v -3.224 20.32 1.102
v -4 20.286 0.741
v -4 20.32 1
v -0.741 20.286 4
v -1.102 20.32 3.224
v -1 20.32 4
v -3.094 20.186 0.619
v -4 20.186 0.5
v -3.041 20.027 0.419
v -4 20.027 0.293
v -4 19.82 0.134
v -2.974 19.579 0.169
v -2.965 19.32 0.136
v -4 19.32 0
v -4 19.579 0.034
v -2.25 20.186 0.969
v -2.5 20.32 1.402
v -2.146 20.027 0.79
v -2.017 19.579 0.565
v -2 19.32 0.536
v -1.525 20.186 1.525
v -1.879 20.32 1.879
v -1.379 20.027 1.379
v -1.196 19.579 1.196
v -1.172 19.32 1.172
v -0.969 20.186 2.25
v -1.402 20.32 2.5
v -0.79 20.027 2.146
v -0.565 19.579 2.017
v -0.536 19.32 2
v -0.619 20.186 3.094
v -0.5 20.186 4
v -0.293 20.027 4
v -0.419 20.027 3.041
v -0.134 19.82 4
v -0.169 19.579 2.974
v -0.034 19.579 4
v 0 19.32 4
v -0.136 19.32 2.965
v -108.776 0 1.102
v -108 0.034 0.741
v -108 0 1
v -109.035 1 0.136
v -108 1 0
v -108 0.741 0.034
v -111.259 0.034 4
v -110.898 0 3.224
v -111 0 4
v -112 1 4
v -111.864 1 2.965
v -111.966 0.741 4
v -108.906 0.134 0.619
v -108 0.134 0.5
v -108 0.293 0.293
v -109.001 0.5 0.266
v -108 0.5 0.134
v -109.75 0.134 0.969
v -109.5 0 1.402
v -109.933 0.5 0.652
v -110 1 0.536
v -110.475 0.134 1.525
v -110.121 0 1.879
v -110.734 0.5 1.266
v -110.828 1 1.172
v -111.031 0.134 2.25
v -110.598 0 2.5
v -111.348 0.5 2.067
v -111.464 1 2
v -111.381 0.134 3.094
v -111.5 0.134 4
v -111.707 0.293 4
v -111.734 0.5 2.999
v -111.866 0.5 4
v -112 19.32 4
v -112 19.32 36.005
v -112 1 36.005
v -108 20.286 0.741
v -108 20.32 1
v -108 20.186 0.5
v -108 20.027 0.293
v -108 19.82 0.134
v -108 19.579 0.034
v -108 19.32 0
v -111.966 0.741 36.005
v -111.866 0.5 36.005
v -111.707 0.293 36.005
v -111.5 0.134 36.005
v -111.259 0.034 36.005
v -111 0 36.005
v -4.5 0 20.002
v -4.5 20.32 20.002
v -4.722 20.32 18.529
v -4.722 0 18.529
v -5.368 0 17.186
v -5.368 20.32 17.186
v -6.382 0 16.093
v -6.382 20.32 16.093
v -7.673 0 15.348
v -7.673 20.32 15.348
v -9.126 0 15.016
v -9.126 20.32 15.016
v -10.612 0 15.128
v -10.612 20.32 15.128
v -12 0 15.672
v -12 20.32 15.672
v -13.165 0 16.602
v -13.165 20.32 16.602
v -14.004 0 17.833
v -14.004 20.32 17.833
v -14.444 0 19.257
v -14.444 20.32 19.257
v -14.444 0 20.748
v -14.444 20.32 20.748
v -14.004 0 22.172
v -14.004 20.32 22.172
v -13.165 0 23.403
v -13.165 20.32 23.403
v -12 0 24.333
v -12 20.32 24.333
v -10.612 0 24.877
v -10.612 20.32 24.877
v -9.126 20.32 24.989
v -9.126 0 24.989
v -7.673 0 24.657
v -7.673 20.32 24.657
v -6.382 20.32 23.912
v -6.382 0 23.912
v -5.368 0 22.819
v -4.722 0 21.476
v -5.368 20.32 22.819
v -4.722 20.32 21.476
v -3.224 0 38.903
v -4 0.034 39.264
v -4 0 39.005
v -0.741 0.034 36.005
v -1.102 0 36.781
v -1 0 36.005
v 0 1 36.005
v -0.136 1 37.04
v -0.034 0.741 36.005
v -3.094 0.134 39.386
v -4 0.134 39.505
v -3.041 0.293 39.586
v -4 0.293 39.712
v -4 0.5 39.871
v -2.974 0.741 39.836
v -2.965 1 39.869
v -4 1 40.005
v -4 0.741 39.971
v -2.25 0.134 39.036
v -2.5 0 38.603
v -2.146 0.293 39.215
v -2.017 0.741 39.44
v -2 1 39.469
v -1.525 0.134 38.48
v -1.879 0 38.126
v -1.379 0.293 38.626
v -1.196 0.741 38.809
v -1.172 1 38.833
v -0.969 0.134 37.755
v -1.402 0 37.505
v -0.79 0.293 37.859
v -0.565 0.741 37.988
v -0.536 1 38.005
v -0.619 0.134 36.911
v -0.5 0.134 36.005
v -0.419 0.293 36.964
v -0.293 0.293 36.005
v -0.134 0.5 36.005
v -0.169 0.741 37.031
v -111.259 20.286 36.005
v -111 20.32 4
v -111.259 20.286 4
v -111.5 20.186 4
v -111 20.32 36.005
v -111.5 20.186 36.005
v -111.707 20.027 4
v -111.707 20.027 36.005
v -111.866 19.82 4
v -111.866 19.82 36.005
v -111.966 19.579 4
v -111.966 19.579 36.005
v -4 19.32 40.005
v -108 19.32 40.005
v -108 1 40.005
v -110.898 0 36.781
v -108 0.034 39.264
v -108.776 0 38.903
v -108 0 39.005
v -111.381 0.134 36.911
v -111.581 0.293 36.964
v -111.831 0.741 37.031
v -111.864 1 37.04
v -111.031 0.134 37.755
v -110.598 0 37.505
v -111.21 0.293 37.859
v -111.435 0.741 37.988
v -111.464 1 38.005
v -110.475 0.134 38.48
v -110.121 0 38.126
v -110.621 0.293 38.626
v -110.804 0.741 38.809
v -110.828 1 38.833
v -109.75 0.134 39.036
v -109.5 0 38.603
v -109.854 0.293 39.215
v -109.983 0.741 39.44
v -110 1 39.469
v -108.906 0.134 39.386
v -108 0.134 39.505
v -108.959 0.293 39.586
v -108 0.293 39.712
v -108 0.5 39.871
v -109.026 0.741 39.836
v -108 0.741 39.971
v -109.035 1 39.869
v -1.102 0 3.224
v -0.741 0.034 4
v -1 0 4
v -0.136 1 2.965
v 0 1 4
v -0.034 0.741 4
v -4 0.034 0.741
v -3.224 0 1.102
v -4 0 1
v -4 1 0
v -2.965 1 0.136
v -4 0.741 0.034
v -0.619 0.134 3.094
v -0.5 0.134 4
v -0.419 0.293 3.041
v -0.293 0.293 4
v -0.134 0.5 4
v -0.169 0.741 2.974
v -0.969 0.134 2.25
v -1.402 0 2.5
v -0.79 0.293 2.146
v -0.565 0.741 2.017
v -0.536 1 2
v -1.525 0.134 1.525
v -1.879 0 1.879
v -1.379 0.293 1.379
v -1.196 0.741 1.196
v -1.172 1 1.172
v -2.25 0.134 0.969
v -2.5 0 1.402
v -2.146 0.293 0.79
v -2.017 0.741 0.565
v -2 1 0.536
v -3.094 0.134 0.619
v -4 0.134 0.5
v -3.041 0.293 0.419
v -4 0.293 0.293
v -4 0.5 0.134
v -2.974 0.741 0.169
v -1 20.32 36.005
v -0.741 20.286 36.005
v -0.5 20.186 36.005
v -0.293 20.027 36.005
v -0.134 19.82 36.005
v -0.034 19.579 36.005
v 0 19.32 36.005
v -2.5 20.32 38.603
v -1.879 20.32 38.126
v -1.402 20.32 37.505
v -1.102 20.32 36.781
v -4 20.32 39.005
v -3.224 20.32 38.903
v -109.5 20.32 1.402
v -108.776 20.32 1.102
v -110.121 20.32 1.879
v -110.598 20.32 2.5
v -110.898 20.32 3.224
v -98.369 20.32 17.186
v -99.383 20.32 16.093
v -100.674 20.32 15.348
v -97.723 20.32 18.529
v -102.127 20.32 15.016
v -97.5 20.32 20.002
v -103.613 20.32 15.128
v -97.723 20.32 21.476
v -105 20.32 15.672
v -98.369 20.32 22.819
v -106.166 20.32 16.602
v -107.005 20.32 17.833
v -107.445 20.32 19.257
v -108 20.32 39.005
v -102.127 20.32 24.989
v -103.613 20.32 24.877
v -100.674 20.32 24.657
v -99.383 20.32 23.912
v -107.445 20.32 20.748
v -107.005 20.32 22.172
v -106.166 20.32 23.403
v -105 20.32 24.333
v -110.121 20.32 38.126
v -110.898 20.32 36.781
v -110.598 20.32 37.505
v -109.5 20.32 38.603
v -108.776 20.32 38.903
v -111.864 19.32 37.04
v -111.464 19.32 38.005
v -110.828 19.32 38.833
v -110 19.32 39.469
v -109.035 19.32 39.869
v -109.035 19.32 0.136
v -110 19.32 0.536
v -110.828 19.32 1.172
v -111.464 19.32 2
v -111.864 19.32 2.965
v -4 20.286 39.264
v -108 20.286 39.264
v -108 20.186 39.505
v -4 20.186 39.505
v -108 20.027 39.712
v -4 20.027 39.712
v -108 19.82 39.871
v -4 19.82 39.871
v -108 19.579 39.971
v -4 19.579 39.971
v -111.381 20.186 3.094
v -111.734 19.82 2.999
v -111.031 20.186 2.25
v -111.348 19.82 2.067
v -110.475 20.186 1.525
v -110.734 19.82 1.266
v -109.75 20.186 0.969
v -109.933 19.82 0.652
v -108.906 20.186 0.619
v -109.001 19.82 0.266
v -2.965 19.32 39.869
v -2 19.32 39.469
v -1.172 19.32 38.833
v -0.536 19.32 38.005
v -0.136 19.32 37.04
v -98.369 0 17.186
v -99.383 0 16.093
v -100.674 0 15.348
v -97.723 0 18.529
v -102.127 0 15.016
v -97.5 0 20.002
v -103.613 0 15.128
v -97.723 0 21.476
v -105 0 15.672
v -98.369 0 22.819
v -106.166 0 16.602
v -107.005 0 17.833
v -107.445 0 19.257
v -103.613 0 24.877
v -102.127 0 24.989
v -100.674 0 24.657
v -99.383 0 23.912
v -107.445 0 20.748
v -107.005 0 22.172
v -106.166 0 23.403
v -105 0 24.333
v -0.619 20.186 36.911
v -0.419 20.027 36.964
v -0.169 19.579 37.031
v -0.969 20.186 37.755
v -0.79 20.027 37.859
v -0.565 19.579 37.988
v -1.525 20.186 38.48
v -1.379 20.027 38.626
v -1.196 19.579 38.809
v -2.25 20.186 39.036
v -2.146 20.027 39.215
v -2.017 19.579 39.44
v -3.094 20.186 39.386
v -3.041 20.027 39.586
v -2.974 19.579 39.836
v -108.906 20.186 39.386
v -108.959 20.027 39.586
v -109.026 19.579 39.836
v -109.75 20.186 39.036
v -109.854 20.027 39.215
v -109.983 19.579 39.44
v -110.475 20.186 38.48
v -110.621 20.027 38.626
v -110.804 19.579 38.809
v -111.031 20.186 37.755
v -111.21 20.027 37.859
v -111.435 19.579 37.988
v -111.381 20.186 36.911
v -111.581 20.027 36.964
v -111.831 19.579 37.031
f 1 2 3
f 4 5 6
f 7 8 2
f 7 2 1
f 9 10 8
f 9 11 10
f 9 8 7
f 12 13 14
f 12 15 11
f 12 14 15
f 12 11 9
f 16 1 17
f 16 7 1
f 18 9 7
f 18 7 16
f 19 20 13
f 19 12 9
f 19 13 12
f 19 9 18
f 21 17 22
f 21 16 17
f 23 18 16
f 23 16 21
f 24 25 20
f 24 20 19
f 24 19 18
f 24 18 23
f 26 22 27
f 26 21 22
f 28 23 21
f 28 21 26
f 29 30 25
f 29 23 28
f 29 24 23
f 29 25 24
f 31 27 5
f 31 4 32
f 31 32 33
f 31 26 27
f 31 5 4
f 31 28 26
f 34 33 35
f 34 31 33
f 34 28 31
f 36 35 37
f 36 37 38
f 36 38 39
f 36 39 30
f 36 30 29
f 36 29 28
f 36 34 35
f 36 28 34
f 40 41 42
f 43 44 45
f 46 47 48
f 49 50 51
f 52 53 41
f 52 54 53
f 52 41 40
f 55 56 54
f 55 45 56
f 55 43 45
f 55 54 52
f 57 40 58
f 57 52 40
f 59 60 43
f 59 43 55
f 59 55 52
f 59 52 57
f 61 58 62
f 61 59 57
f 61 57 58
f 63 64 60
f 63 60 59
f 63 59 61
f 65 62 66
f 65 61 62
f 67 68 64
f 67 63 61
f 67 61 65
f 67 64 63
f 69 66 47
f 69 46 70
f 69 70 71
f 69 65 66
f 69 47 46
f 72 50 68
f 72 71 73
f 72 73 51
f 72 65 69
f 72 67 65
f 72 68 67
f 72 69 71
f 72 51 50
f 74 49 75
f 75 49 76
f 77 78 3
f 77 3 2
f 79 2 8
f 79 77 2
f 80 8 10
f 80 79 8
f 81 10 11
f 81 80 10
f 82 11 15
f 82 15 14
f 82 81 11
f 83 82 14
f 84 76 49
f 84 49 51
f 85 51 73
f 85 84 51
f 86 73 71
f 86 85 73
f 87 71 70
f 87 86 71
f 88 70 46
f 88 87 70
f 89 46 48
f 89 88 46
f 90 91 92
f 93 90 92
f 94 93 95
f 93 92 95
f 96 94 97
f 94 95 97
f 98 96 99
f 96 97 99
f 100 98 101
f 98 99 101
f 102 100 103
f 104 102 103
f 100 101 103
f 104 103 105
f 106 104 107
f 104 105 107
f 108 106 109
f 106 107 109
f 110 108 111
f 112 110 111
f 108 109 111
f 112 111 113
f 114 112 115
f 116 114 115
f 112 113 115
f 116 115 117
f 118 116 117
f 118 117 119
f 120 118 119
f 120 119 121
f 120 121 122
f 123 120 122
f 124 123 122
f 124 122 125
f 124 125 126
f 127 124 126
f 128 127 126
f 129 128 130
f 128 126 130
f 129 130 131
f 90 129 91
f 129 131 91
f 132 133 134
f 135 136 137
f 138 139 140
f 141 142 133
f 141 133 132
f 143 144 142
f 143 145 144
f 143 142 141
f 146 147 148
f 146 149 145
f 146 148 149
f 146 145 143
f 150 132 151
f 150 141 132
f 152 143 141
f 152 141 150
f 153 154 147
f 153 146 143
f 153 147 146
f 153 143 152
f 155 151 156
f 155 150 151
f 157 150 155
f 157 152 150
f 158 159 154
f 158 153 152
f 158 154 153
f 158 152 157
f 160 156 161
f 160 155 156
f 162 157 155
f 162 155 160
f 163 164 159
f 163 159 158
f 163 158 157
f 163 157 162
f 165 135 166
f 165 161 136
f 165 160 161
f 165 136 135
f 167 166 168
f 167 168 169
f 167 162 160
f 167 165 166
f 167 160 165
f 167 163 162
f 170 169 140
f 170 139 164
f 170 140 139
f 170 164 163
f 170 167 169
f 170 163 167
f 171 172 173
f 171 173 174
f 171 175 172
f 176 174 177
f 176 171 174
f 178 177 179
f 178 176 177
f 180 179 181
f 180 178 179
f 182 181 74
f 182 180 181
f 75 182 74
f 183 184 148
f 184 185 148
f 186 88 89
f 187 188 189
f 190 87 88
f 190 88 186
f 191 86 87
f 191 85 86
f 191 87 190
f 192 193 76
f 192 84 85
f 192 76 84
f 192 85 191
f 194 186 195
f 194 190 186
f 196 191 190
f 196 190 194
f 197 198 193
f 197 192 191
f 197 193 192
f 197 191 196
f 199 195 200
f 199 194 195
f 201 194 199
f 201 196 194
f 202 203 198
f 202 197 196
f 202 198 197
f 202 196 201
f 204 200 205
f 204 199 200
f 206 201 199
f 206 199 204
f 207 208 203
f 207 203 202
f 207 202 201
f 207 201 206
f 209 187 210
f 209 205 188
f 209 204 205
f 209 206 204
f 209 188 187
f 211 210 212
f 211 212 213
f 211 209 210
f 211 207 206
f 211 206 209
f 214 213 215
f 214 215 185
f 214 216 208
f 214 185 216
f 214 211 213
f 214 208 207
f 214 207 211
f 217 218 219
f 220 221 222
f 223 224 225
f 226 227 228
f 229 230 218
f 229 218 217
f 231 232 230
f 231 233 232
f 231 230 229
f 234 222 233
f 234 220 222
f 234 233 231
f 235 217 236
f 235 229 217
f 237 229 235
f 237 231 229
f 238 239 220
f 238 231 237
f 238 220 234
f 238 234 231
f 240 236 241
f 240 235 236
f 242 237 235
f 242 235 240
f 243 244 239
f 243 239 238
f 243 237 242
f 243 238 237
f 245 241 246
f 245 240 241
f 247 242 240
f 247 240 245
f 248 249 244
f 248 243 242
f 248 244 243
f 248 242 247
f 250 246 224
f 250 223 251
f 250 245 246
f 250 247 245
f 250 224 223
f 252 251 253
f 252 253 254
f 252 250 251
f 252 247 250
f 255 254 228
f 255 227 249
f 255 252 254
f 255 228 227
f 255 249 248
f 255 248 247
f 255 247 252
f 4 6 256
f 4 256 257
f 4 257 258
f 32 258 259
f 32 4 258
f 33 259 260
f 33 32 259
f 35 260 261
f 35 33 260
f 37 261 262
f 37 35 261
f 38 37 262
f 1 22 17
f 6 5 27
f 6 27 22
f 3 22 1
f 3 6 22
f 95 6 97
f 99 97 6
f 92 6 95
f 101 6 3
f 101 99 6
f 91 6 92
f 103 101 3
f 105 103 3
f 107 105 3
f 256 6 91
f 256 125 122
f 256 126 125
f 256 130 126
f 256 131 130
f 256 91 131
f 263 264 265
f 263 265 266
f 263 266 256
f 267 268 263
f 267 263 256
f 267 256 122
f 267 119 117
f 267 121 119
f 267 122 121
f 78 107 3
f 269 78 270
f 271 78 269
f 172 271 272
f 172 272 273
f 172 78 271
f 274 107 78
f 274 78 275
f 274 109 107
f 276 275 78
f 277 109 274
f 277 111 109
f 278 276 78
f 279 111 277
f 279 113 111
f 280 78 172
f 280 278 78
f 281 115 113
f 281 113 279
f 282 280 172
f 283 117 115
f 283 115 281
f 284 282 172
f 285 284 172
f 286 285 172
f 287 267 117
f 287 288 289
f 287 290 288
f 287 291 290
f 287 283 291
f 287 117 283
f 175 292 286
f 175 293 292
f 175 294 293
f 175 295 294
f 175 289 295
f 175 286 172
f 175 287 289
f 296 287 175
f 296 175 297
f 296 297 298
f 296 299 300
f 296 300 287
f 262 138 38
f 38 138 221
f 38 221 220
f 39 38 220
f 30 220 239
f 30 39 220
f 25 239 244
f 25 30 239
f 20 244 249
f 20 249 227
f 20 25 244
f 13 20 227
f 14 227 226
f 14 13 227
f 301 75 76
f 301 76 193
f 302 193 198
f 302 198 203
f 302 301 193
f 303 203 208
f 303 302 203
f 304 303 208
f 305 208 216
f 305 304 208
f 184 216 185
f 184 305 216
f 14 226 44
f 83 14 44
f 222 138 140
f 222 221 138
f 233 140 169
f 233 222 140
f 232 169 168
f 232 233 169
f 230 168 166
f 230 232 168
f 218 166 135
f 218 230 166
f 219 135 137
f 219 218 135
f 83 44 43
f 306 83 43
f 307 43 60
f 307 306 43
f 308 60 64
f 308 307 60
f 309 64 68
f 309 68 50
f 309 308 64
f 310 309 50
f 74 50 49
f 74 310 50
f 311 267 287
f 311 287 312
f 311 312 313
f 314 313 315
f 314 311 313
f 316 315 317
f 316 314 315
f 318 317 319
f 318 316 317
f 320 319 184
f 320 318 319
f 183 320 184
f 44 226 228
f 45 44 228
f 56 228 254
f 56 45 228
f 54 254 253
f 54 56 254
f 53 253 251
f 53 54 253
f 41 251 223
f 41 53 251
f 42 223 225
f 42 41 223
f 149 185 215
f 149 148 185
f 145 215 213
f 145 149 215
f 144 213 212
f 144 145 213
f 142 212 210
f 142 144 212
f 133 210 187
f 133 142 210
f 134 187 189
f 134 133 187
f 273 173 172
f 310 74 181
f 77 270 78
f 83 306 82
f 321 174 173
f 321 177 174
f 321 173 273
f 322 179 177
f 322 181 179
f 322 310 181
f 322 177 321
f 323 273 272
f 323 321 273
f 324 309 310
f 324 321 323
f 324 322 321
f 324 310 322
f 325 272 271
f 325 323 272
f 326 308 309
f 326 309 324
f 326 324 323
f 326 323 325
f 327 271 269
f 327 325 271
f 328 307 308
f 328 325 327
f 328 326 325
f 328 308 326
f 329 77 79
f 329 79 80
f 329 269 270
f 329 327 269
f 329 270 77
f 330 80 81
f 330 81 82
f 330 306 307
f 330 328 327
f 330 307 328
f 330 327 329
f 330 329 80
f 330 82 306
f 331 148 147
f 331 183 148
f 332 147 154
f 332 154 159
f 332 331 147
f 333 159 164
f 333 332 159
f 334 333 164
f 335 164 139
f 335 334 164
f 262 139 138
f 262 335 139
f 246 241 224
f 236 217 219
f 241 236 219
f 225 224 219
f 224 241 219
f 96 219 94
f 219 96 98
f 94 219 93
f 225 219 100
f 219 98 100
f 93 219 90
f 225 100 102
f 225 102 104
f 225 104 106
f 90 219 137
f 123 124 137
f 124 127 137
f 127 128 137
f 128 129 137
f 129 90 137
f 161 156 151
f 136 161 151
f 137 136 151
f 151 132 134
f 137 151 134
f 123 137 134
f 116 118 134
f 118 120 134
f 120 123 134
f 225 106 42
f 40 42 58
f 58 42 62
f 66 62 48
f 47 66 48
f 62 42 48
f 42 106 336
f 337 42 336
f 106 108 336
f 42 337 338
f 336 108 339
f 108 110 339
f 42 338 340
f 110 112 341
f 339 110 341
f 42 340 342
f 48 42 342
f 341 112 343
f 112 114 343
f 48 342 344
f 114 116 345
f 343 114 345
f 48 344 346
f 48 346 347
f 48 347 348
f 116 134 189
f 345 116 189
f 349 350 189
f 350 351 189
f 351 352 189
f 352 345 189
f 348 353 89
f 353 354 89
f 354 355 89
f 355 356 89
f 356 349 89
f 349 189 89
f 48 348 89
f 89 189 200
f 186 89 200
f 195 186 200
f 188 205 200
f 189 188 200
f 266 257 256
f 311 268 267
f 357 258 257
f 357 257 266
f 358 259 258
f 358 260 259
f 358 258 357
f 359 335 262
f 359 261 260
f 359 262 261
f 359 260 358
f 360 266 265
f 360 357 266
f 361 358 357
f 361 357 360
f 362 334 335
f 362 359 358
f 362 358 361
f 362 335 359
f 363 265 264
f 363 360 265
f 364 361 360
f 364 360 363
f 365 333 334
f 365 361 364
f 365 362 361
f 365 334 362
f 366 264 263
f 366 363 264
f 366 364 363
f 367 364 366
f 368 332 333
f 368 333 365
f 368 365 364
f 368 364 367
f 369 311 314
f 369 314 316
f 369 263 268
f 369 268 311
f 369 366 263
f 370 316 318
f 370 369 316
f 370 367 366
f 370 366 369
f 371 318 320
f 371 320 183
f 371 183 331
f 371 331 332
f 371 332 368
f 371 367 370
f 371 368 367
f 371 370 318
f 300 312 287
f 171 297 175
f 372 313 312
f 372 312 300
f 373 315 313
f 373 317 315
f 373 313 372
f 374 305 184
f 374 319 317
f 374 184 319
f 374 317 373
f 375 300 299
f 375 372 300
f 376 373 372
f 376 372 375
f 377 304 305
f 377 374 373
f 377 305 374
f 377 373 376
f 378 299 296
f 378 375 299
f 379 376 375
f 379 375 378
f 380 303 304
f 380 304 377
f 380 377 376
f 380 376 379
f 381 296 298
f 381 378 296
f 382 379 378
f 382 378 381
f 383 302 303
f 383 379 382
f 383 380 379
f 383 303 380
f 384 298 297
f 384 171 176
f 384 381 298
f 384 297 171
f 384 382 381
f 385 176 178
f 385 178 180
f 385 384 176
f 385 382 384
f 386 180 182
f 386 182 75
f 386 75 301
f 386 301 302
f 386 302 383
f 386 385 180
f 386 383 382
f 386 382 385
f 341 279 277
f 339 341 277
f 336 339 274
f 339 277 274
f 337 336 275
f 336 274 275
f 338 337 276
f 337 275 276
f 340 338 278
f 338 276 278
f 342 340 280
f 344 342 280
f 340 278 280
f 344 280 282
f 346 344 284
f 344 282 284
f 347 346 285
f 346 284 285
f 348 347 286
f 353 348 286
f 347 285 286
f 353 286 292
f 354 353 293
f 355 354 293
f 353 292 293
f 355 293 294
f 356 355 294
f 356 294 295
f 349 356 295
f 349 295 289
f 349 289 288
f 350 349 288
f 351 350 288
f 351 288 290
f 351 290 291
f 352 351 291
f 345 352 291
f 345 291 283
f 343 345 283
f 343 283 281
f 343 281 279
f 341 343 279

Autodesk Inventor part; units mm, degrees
ref_plane "YZ Plane" through (0, 0, 0) normal (1, 0, 0) x (0, 1, 0)
ref_plane "XZ Plane" through (0, 0, 0) normal (0, 1, 0) x (-1, 0, 0)
ref_plane "XY Plane" through (0, 0, 0) normal (0, 0, 1) x (1, 0, 0)
sketch "Sketch1" plane through (0, 0, 0) normal (0, 1, 0) x (-1, 0, 0)
  line L0 (0, 0) -> (112, 0)
  line L1 (112, 0) -> (112, 40.005)
  line L2 (112, 40.005) -> (0, 40.005)
  line L3 (0, 40.005) -> (0, 0)
  dimension "d0" = 112
  dimension "d1" = 40.005
extrude "Extrusion1" add sketch "Sketch1" along normal blind 20.32
sketch "Sketch2" plane through (0, 20.32, 0) normal (0, 1, 0) x (1, 0, 0)
  line L0 (-112, 0) -> (-112, -40.005) projected
  line L1 (0, -40.005) -> (0, 0) projected
  line L2 (-112, -20.0025) -> (-102.5004, -20.0025) construction
  line L3 (0, -20.0025) -> (-9.4996, -20.0025) construction
  circle A0 centre (-9.4996, -20.0025) radius 5
  circle A1 centre (-102.5004, -20.0025) radius 5
  dimension "d4" = 9.4996
  dimension "d5" = 9.4996
  dimension "d6" = 10
  dimension "d7" = 10
extrude "Extrusion2" cut sketch "Sketch2" against normal blind 20.32
fillet "Fillet1" radius 4 4 edges at (-112, 10.16, 40.005) (-112, 10.16, 0) (0, 10.16, 40.005) (0, 10.16, 0)
fillet "Fillet2" radius 1 16 edges at (-110.8284, 0, 1.1716) (-112, 0, 20.0025) (-110.8284, 0, 38.8334) (-56, 0, 40.005) (-1.1716, 0, 38.8334) (0, 0, 20.0025) (-1.1716, 0, 1.1716) (-56, 0, 0) (-110.8284, 20.32, 1.1716) (-112, 20.32, 20.0025) (-110.8284, 20.32, 38.8334) (-56, 20.32, 40.005) (-1.1716, 20.32, 38.8334) (0, 20.32, 20.0025) (-1.1716, 20.32, 1.1716) (-56, 20.32, 0)
equation "\"d5\" = d4"
properties part number "CIM Mount Top" material "Aluminum 6061"
